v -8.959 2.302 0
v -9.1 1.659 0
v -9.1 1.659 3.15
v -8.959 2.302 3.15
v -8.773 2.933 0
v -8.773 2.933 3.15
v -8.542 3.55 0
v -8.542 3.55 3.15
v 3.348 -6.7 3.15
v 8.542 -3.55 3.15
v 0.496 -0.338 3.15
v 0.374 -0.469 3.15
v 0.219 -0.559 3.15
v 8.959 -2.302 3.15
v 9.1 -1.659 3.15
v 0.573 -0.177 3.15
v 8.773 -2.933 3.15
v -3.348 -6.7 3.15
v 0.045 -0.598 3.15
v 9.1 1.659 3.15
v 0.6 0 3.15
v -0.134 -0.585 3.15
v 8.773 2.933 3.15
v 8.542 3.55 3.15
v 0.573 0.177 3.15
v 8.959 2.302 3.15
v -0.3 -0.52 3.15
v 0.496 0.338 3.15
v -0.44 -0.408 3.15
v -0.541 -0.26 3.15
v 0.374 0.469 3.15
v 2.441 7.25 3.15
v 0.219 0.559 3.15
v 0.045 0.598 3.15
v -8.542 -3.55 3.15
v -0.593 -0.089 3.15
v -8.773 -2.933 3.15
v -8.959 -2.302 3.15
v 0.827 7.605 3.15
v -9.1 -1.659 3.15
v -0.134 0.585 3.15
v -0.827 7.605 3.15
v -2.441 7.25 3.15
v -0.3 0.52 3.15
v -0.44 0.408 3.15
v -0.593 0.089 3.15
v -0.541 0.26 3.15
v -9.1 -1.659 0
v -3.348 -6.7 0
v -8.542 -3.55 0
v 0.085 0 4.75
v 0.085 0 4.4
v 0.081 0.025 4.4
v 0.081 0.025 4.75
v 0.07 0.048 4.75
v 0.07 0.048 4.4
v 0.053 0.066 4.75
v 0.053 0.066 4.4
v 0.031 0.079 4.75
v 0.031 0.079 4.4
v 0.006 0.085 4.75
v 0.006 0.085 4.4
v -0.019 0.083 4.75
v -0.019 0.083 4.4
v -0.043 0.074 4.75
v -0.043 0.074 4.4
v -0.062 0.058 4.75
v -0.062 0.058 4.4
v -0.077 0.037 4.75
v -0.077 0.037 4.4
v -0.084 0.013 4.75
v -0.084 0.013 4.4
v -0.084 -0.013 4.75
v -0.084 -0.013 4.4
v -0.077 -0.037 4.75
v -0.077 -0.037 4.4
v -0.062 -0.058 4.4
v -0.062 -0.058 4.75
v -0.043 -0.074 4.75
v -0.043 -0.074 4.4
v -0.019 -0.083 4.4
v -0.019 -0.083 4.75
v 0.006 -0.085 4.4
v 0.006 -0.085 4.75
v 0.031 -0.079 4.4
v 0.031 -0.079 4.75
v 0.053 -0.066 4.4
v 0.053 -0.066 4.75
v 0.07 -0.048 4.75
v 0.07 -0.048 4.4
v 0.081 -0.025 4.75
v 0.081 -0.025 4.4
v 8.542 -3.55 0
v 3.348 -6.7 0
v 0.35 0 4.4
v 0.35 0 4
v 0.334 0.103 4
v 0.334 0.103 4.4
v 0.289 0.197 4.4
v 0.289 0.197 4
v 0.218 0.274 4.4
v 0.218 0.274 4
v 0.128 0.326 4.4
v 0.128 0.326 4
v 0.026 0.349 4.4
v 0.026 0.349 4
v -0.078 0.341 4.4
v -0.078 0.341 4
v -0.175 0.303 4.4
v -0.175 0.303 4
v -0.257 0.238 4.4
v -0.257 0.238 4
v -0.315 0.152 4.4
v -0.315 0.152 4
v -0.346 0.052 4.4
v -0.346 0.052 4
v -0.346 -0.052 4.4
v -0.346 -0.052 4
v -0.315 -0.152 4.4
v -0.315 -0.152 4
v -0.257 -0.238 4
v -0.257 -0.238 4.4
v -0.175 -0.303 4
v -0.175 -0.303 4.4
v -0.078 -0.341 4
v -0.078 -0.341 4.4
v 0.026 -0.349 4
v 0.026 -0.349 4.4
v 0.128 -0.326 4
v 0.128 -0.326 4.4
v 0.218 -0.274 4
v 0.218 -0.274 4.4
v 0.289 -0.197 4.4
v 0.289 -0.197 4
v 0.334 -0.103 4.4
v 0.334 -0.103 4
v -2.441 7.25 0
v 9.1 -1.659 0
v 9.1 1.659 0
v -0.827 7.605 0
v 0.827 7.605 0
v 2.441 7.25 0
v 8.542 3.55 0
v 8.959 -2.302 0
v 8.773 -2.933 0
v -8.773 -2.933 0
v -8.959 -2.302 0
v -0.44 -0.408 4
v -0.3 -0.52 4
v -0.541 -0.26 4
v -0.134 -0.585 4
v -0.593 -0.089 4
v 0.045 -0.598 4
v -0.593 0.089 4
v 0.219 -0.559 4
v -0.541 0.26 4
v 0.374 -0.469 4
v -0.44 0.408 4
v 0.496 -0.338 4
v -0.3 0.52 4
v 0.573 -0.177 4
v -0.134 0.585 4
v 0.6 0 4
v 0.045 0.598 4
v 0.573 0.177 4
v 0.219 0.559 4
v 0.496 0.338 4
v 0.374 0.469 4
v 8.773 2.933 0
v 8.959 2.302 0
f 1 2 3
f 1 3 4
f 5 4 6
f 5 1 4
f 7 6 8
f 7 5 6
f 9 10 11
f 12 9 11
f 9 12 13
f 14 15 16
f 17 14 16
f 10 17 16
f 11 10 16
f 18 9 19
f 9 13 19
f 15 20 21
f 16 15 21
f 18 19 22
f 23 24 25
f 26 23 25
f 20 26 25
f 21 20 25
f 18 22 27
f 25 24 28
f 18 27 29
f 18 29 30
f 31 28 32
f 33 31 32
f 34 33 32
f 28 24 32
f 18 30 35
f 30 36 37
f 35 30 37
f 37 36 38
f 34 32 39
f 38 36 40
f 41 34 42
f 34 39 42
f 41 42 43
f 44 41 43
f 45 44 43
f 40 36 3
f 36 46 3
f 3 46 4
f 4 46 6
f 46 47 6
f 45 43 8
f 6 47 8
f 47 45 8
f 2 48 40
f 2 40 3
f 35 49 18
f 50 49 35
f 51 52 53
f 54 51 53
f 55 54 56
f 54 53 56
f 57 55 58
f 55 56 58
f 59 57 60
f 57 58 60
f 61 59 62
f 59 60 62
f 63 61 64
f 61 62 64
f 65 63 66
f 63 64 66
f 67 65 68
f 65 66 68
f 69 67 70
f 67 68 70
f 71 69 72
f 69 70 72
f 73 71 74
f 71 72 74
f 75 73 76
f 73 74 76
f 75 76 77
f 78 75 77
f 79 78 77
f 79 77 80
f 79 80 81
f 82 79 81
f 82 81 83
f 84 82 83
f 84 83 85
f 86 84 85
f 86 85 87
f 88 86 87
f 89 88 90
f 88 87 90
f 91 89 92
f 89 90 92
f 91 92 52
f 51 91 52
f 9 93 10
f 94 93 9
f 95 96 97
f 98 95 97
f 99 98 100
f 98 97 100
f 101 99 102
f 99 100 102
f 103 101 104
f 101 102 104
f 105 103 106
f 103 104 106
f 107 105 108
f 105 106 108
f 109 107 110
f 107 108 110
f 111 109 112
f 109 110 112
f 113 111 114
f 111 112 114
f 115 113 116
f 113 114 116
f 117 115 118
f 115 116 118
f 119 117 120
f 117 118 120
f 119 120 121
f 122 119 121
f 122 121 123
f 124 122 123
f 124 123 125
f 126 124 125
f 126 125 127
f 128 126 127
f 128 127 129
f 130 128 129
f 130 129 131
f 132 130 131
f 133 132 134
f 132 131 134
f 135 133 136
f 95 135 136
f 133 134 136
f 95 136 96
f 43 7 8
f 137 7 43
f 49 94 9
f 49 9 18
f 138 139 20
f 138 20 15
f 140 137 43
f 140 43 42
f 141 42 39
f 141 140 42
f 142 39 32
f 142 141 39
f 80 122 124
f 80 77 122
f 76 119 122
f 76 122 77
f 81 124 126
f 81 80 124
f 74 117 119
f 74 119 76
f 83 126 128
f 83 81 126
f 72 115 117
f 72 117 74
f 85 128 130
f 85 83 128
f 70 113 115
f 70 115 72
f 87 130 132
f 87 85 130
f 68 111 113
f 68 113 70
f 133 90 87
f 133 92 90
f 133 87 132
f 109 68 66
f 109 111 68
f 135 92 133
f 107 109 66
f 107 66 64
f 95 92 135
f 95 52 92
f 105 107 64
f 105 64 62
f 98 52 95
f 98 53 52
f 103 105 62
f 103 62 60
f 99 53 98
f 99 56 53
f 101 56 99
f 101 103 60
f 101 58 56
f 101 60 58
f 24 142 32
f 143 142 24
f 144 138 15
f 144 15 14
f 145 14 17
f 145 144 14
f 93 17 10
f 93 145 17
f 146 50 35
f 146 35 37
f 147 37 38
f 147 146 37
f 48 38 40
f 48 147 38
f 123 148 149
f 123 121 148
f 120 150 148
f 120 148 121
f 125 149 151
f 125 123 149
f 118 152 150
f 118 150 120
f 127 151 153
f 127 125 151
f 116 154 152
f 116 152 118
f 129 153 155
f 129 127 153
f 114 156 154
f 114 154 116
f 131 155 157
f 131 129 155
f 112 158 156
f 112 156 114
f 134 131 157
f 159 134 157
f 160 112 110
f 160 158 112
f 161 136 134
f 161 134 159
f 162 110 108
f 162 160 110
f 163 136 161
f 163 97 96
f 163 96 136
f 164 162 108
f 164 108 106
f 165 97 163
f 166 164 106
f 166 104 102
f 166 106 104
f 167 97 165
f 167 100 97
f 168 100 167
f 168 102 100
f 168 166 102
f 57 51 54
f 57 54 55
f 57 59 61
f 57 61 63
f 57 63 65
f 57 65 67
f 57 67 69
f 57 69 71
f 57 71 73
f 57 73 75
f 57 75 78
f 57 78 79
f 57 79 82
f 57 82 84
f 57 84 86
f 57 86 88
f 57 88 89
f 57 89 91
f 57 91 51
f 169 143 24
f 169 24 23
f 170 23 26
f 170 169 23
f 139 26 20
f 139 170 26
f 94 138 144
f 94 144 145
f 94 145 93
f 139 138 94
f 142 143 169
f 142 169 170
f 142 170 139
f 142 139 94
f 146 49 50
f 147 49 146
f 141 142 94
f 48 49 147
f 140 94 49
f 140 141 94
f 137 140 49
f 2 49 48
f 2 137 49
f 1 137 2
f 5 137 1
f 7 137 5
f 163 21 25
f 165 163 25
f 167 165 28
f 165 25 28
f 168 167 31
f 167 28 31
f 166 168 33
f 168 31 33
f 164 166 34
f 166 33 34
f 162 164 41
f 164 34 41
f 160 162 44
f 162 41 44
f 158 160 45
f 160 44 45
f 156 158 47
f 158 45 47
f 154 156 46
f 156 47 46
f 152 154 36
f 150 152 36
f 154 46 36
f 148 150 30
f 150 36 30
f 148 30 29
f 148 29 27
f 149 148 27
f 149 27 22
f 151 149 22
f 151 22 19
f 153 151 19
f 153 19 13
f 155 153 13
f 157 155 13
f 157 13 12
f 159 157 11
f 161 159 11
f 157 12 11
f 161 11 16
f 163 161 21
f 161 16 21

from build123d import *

# Parameters (mm, degrees)
BOSS_EXTRU_1_DEPTH = 3.15
ESQUISSE4_R        = 0.6
BOSS_EXTRU_2_DEPTH = 0.85
ESQUISSE5_R        = 0.35
BOSS_EXTRU_3_DEPTH = 0.4
ESQUISSE6_R        = 0.085
BOSS_EXTRU_4_DEPTH = 0.35


with BuildPart() as part:
    # Esquisse2 → Boss.-Extru.1 (new body)
    with BuildSketch(Plane.XY):
        with BuildLine():
            Line((9.1, 1.659066002), (9.1, -1.659066002))
            ThreePointArc((9.1, -1.659066002), (8.871356868, -2.619451721), (8.541662602, -3.55))
            Line((8.541662602, -3.55), (3.348120127, -6.7))
            Line((3.348120127, -6.7), (-3.348120127, -6.7))
            Line((-3.348120127, -6.7), (-8.541662602, -3.55))
            ThreePointArc((-8.541662602, -3.55), (-8.871356868, -2.619451721), (-9.1, -1.659066002))
            Line((-9.1, -1.659066002), (-9.1, 1.659066002))
            ThreePointArc((-9.1, 1.659066002), (-8.871356868, 2.619451721), (-8.541662602, 3.55))
            Line((-8.541662602, 3.55), (-2.441311123, 7.25))
            ThreePointArc((-2.441311123, 7.25), (0, 7.65), (2.441311123, 7.25))
            Line((2.441311123, 7.25), (8.541662602, 3.55))
            ThreePointArc((8.541662602, 3.55), (8.871356868, 2.619451721), (9.1, 1.659066002))
        make_face()
    extrude(amount=BOSS_EXTRU_1_DEPTH)

    # Esquisse4 → Boss.-Extru.2 (add)
    with BuildSketch(Plane.XY.offset(3.15)):
        Circle(ESQUISSE4_R)
    extrude(amount=BOSS_EXTRU_2_DEPTH)

    # Esquisse5 → Boss.-Extru.3 (add)
    with BuildSketch(Plane.XY.offset(4)):
        Circle(ESQUISSE5_R)
    extrude(amount=BOSS_EXTRU_3_DEPTH)

    # Esquisse6 → Boss.-Extru.4 (add)
    with BuildSketch(Plane.XY.offset(4.4)):
        Circle(ESQUISSE6_R)
    extrude(amount=BOSS_EXTRU_4_DEPTH)


solid = part.part
